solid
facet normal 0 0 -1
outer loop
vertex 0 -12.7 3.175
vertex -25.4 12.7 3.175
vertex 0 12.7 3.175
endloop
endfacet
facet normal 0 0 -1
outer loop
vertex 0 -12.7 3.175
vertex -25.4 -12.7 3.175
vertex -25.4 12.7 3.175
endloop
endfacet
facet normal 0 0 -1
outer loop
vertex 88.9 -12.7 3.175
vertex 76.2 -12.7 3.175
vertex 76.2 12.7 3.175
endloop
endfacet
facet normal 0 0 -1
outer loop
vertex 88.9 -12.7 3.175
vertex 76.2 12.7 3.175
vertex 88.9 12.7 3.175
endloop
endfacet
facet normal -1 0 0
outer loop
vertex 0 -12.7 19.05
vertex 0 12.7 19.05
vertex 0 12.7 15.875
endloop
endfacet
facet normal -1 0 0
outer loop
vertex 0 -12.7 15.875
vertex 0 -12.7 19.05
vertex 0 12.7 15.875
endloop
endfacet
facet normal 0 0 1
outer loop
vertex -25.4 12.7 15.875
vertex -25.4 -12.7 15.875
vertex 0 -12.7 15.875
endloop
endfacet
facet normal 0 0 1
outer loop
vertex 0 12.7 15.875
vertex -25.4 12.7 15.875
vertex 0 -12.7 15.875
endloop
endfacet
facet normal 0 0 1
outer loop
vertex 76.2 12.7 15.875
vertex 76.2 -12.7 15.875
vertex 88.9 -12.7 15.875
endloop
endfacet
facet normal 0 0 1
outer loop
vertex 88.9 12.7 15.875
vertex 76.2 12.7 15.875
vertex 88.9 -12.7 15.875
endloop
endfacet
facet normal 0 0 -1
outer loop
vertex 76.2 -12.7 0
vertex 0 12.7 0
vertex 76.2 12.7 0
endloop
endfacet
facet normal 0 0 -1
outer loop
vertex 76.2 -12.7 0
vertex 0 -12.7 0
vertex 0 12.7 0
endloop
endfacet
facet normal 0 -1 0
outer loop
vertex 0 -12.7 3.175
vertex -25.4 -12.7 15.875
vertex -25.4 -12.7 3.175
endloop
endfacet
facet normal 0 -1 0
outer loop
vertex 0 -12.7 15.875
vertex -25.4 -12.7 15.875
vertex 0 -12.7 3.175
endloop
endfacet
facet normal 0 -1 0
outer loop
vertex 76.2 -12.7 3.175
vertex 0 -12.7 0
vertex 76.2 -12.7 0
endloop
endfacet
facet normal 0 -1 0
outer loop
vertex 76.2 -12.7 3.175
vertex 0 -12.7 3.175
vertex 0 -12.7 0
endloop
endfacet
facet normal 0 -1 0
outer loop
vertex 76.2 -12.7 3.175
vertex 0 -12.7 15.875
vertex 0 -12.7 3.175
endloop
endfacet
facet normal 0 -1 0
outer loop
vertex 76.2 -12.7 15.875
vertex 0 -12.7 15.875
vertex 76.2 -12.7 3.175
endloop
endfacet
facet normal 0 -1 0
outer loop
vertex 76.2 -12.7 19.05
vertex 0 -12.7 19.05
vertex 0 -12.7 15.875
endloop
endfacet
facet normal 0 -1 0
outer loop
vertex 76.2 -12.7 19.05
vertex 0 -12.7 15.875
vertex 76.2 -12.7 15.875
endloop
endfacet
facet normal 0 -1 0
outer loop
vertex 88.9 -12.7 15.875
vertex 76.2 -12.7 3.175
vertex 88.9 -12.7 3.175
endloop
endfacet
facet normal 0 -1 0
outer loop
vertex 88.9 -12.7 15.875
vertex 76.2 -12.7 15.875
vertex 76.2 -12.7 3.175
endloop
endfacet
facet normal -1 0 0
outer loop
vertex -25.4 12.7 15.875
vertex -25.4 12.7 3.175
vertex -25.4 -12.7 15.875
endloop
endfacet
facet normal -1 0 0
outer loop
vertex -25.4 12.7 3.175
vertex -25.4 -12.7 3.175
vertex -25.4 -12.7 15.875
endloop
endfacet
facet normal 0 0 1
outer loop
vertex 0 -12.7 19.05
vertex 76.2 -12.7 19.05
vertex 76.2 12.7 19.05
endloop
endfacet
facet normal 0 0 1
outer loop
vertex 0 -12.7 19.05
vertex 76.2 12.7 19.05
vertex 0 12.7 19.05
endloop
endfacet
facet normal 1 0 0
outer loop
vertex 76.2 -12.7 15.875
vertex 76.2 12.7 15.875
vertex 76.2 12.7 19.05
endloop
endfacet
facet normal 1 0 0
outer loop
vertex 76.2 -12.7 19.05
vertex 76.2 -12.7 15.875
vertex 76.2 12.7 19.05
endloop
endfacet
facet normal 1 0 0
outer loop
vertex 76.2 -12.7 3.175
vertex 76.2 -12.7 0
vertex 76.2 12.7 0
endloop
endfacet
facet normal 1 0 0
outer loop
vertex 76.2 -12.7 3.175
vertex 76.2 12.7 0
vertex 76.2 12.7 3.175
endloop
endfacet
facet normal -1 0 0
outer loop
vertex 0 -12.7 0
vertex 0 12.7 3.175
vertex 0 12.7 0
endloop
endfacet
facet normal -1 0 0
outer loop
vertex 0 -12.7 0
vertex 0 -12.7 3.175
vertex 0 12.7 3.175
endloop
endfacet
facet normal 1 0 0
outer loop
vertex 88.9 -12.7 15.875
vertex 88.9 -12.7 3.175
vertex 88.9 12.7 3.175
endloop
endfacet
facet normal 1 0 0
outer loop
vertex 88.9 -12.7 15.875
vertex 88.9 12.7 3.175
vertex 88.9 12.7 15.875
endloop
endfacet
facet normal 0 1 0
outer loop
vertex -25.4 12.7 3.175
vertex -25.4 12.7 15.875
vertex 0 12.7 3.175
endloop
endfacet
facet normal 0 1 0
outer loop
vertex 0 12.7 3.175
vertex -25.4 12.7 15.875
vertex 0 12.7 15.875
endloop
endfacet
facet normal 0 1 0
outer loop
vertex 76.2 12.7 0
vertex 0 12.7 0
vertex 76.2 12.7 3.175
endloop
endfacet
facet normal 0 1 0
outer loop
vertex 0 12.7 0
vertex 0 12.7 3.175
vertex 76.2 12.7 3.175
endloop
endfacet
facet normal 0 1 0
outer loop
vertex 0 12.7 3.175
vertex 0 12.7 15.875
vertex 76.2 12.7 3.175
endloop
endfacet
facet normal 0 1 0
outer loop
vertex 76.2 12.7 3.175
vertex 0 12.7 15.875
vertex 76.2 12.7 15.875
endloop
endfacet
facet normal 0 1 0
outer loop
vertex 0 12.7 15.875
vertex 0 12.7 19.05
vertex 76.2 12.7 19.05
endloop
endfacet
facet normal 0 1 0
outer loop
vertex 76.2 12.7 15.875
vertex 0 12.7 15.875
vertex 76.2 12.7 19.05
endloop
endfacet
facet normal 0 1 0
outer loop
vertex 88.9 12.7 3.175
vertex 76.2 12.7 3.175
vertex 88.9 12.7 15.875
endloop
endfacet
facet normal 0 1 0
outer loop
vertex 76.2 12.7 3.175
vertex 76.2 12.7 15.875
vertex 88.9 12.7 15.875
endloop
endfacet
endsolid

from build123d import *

# Parameters (mm, degrees)
F0_W     = 25.4
F0_H     = 12.7
F0_W_2   = 12.7
F1_DEPTH = 12.7


with BuildPart() as f1:
    # F0 (on Front) → F1 (new body, symmetric)
    with BuildSketch(Plane.XZ):
        Polygon((0, 3.175), (0, 0), (76.2, 0), (76.2, 3.175), (76.2, 15.875), (76.2, 19.05), (0, 19.05), (0, 15.875), align=None)
        with Locations((-12.7, 9.525)):
            Rectangle(F0_W, F0_H)
        with Locations((82.55, 9.525)):
            Rectangle(F0_W_2, F0_H)
    extrude(amount=F1_DEPTH, both=True)


solid = f1.part
